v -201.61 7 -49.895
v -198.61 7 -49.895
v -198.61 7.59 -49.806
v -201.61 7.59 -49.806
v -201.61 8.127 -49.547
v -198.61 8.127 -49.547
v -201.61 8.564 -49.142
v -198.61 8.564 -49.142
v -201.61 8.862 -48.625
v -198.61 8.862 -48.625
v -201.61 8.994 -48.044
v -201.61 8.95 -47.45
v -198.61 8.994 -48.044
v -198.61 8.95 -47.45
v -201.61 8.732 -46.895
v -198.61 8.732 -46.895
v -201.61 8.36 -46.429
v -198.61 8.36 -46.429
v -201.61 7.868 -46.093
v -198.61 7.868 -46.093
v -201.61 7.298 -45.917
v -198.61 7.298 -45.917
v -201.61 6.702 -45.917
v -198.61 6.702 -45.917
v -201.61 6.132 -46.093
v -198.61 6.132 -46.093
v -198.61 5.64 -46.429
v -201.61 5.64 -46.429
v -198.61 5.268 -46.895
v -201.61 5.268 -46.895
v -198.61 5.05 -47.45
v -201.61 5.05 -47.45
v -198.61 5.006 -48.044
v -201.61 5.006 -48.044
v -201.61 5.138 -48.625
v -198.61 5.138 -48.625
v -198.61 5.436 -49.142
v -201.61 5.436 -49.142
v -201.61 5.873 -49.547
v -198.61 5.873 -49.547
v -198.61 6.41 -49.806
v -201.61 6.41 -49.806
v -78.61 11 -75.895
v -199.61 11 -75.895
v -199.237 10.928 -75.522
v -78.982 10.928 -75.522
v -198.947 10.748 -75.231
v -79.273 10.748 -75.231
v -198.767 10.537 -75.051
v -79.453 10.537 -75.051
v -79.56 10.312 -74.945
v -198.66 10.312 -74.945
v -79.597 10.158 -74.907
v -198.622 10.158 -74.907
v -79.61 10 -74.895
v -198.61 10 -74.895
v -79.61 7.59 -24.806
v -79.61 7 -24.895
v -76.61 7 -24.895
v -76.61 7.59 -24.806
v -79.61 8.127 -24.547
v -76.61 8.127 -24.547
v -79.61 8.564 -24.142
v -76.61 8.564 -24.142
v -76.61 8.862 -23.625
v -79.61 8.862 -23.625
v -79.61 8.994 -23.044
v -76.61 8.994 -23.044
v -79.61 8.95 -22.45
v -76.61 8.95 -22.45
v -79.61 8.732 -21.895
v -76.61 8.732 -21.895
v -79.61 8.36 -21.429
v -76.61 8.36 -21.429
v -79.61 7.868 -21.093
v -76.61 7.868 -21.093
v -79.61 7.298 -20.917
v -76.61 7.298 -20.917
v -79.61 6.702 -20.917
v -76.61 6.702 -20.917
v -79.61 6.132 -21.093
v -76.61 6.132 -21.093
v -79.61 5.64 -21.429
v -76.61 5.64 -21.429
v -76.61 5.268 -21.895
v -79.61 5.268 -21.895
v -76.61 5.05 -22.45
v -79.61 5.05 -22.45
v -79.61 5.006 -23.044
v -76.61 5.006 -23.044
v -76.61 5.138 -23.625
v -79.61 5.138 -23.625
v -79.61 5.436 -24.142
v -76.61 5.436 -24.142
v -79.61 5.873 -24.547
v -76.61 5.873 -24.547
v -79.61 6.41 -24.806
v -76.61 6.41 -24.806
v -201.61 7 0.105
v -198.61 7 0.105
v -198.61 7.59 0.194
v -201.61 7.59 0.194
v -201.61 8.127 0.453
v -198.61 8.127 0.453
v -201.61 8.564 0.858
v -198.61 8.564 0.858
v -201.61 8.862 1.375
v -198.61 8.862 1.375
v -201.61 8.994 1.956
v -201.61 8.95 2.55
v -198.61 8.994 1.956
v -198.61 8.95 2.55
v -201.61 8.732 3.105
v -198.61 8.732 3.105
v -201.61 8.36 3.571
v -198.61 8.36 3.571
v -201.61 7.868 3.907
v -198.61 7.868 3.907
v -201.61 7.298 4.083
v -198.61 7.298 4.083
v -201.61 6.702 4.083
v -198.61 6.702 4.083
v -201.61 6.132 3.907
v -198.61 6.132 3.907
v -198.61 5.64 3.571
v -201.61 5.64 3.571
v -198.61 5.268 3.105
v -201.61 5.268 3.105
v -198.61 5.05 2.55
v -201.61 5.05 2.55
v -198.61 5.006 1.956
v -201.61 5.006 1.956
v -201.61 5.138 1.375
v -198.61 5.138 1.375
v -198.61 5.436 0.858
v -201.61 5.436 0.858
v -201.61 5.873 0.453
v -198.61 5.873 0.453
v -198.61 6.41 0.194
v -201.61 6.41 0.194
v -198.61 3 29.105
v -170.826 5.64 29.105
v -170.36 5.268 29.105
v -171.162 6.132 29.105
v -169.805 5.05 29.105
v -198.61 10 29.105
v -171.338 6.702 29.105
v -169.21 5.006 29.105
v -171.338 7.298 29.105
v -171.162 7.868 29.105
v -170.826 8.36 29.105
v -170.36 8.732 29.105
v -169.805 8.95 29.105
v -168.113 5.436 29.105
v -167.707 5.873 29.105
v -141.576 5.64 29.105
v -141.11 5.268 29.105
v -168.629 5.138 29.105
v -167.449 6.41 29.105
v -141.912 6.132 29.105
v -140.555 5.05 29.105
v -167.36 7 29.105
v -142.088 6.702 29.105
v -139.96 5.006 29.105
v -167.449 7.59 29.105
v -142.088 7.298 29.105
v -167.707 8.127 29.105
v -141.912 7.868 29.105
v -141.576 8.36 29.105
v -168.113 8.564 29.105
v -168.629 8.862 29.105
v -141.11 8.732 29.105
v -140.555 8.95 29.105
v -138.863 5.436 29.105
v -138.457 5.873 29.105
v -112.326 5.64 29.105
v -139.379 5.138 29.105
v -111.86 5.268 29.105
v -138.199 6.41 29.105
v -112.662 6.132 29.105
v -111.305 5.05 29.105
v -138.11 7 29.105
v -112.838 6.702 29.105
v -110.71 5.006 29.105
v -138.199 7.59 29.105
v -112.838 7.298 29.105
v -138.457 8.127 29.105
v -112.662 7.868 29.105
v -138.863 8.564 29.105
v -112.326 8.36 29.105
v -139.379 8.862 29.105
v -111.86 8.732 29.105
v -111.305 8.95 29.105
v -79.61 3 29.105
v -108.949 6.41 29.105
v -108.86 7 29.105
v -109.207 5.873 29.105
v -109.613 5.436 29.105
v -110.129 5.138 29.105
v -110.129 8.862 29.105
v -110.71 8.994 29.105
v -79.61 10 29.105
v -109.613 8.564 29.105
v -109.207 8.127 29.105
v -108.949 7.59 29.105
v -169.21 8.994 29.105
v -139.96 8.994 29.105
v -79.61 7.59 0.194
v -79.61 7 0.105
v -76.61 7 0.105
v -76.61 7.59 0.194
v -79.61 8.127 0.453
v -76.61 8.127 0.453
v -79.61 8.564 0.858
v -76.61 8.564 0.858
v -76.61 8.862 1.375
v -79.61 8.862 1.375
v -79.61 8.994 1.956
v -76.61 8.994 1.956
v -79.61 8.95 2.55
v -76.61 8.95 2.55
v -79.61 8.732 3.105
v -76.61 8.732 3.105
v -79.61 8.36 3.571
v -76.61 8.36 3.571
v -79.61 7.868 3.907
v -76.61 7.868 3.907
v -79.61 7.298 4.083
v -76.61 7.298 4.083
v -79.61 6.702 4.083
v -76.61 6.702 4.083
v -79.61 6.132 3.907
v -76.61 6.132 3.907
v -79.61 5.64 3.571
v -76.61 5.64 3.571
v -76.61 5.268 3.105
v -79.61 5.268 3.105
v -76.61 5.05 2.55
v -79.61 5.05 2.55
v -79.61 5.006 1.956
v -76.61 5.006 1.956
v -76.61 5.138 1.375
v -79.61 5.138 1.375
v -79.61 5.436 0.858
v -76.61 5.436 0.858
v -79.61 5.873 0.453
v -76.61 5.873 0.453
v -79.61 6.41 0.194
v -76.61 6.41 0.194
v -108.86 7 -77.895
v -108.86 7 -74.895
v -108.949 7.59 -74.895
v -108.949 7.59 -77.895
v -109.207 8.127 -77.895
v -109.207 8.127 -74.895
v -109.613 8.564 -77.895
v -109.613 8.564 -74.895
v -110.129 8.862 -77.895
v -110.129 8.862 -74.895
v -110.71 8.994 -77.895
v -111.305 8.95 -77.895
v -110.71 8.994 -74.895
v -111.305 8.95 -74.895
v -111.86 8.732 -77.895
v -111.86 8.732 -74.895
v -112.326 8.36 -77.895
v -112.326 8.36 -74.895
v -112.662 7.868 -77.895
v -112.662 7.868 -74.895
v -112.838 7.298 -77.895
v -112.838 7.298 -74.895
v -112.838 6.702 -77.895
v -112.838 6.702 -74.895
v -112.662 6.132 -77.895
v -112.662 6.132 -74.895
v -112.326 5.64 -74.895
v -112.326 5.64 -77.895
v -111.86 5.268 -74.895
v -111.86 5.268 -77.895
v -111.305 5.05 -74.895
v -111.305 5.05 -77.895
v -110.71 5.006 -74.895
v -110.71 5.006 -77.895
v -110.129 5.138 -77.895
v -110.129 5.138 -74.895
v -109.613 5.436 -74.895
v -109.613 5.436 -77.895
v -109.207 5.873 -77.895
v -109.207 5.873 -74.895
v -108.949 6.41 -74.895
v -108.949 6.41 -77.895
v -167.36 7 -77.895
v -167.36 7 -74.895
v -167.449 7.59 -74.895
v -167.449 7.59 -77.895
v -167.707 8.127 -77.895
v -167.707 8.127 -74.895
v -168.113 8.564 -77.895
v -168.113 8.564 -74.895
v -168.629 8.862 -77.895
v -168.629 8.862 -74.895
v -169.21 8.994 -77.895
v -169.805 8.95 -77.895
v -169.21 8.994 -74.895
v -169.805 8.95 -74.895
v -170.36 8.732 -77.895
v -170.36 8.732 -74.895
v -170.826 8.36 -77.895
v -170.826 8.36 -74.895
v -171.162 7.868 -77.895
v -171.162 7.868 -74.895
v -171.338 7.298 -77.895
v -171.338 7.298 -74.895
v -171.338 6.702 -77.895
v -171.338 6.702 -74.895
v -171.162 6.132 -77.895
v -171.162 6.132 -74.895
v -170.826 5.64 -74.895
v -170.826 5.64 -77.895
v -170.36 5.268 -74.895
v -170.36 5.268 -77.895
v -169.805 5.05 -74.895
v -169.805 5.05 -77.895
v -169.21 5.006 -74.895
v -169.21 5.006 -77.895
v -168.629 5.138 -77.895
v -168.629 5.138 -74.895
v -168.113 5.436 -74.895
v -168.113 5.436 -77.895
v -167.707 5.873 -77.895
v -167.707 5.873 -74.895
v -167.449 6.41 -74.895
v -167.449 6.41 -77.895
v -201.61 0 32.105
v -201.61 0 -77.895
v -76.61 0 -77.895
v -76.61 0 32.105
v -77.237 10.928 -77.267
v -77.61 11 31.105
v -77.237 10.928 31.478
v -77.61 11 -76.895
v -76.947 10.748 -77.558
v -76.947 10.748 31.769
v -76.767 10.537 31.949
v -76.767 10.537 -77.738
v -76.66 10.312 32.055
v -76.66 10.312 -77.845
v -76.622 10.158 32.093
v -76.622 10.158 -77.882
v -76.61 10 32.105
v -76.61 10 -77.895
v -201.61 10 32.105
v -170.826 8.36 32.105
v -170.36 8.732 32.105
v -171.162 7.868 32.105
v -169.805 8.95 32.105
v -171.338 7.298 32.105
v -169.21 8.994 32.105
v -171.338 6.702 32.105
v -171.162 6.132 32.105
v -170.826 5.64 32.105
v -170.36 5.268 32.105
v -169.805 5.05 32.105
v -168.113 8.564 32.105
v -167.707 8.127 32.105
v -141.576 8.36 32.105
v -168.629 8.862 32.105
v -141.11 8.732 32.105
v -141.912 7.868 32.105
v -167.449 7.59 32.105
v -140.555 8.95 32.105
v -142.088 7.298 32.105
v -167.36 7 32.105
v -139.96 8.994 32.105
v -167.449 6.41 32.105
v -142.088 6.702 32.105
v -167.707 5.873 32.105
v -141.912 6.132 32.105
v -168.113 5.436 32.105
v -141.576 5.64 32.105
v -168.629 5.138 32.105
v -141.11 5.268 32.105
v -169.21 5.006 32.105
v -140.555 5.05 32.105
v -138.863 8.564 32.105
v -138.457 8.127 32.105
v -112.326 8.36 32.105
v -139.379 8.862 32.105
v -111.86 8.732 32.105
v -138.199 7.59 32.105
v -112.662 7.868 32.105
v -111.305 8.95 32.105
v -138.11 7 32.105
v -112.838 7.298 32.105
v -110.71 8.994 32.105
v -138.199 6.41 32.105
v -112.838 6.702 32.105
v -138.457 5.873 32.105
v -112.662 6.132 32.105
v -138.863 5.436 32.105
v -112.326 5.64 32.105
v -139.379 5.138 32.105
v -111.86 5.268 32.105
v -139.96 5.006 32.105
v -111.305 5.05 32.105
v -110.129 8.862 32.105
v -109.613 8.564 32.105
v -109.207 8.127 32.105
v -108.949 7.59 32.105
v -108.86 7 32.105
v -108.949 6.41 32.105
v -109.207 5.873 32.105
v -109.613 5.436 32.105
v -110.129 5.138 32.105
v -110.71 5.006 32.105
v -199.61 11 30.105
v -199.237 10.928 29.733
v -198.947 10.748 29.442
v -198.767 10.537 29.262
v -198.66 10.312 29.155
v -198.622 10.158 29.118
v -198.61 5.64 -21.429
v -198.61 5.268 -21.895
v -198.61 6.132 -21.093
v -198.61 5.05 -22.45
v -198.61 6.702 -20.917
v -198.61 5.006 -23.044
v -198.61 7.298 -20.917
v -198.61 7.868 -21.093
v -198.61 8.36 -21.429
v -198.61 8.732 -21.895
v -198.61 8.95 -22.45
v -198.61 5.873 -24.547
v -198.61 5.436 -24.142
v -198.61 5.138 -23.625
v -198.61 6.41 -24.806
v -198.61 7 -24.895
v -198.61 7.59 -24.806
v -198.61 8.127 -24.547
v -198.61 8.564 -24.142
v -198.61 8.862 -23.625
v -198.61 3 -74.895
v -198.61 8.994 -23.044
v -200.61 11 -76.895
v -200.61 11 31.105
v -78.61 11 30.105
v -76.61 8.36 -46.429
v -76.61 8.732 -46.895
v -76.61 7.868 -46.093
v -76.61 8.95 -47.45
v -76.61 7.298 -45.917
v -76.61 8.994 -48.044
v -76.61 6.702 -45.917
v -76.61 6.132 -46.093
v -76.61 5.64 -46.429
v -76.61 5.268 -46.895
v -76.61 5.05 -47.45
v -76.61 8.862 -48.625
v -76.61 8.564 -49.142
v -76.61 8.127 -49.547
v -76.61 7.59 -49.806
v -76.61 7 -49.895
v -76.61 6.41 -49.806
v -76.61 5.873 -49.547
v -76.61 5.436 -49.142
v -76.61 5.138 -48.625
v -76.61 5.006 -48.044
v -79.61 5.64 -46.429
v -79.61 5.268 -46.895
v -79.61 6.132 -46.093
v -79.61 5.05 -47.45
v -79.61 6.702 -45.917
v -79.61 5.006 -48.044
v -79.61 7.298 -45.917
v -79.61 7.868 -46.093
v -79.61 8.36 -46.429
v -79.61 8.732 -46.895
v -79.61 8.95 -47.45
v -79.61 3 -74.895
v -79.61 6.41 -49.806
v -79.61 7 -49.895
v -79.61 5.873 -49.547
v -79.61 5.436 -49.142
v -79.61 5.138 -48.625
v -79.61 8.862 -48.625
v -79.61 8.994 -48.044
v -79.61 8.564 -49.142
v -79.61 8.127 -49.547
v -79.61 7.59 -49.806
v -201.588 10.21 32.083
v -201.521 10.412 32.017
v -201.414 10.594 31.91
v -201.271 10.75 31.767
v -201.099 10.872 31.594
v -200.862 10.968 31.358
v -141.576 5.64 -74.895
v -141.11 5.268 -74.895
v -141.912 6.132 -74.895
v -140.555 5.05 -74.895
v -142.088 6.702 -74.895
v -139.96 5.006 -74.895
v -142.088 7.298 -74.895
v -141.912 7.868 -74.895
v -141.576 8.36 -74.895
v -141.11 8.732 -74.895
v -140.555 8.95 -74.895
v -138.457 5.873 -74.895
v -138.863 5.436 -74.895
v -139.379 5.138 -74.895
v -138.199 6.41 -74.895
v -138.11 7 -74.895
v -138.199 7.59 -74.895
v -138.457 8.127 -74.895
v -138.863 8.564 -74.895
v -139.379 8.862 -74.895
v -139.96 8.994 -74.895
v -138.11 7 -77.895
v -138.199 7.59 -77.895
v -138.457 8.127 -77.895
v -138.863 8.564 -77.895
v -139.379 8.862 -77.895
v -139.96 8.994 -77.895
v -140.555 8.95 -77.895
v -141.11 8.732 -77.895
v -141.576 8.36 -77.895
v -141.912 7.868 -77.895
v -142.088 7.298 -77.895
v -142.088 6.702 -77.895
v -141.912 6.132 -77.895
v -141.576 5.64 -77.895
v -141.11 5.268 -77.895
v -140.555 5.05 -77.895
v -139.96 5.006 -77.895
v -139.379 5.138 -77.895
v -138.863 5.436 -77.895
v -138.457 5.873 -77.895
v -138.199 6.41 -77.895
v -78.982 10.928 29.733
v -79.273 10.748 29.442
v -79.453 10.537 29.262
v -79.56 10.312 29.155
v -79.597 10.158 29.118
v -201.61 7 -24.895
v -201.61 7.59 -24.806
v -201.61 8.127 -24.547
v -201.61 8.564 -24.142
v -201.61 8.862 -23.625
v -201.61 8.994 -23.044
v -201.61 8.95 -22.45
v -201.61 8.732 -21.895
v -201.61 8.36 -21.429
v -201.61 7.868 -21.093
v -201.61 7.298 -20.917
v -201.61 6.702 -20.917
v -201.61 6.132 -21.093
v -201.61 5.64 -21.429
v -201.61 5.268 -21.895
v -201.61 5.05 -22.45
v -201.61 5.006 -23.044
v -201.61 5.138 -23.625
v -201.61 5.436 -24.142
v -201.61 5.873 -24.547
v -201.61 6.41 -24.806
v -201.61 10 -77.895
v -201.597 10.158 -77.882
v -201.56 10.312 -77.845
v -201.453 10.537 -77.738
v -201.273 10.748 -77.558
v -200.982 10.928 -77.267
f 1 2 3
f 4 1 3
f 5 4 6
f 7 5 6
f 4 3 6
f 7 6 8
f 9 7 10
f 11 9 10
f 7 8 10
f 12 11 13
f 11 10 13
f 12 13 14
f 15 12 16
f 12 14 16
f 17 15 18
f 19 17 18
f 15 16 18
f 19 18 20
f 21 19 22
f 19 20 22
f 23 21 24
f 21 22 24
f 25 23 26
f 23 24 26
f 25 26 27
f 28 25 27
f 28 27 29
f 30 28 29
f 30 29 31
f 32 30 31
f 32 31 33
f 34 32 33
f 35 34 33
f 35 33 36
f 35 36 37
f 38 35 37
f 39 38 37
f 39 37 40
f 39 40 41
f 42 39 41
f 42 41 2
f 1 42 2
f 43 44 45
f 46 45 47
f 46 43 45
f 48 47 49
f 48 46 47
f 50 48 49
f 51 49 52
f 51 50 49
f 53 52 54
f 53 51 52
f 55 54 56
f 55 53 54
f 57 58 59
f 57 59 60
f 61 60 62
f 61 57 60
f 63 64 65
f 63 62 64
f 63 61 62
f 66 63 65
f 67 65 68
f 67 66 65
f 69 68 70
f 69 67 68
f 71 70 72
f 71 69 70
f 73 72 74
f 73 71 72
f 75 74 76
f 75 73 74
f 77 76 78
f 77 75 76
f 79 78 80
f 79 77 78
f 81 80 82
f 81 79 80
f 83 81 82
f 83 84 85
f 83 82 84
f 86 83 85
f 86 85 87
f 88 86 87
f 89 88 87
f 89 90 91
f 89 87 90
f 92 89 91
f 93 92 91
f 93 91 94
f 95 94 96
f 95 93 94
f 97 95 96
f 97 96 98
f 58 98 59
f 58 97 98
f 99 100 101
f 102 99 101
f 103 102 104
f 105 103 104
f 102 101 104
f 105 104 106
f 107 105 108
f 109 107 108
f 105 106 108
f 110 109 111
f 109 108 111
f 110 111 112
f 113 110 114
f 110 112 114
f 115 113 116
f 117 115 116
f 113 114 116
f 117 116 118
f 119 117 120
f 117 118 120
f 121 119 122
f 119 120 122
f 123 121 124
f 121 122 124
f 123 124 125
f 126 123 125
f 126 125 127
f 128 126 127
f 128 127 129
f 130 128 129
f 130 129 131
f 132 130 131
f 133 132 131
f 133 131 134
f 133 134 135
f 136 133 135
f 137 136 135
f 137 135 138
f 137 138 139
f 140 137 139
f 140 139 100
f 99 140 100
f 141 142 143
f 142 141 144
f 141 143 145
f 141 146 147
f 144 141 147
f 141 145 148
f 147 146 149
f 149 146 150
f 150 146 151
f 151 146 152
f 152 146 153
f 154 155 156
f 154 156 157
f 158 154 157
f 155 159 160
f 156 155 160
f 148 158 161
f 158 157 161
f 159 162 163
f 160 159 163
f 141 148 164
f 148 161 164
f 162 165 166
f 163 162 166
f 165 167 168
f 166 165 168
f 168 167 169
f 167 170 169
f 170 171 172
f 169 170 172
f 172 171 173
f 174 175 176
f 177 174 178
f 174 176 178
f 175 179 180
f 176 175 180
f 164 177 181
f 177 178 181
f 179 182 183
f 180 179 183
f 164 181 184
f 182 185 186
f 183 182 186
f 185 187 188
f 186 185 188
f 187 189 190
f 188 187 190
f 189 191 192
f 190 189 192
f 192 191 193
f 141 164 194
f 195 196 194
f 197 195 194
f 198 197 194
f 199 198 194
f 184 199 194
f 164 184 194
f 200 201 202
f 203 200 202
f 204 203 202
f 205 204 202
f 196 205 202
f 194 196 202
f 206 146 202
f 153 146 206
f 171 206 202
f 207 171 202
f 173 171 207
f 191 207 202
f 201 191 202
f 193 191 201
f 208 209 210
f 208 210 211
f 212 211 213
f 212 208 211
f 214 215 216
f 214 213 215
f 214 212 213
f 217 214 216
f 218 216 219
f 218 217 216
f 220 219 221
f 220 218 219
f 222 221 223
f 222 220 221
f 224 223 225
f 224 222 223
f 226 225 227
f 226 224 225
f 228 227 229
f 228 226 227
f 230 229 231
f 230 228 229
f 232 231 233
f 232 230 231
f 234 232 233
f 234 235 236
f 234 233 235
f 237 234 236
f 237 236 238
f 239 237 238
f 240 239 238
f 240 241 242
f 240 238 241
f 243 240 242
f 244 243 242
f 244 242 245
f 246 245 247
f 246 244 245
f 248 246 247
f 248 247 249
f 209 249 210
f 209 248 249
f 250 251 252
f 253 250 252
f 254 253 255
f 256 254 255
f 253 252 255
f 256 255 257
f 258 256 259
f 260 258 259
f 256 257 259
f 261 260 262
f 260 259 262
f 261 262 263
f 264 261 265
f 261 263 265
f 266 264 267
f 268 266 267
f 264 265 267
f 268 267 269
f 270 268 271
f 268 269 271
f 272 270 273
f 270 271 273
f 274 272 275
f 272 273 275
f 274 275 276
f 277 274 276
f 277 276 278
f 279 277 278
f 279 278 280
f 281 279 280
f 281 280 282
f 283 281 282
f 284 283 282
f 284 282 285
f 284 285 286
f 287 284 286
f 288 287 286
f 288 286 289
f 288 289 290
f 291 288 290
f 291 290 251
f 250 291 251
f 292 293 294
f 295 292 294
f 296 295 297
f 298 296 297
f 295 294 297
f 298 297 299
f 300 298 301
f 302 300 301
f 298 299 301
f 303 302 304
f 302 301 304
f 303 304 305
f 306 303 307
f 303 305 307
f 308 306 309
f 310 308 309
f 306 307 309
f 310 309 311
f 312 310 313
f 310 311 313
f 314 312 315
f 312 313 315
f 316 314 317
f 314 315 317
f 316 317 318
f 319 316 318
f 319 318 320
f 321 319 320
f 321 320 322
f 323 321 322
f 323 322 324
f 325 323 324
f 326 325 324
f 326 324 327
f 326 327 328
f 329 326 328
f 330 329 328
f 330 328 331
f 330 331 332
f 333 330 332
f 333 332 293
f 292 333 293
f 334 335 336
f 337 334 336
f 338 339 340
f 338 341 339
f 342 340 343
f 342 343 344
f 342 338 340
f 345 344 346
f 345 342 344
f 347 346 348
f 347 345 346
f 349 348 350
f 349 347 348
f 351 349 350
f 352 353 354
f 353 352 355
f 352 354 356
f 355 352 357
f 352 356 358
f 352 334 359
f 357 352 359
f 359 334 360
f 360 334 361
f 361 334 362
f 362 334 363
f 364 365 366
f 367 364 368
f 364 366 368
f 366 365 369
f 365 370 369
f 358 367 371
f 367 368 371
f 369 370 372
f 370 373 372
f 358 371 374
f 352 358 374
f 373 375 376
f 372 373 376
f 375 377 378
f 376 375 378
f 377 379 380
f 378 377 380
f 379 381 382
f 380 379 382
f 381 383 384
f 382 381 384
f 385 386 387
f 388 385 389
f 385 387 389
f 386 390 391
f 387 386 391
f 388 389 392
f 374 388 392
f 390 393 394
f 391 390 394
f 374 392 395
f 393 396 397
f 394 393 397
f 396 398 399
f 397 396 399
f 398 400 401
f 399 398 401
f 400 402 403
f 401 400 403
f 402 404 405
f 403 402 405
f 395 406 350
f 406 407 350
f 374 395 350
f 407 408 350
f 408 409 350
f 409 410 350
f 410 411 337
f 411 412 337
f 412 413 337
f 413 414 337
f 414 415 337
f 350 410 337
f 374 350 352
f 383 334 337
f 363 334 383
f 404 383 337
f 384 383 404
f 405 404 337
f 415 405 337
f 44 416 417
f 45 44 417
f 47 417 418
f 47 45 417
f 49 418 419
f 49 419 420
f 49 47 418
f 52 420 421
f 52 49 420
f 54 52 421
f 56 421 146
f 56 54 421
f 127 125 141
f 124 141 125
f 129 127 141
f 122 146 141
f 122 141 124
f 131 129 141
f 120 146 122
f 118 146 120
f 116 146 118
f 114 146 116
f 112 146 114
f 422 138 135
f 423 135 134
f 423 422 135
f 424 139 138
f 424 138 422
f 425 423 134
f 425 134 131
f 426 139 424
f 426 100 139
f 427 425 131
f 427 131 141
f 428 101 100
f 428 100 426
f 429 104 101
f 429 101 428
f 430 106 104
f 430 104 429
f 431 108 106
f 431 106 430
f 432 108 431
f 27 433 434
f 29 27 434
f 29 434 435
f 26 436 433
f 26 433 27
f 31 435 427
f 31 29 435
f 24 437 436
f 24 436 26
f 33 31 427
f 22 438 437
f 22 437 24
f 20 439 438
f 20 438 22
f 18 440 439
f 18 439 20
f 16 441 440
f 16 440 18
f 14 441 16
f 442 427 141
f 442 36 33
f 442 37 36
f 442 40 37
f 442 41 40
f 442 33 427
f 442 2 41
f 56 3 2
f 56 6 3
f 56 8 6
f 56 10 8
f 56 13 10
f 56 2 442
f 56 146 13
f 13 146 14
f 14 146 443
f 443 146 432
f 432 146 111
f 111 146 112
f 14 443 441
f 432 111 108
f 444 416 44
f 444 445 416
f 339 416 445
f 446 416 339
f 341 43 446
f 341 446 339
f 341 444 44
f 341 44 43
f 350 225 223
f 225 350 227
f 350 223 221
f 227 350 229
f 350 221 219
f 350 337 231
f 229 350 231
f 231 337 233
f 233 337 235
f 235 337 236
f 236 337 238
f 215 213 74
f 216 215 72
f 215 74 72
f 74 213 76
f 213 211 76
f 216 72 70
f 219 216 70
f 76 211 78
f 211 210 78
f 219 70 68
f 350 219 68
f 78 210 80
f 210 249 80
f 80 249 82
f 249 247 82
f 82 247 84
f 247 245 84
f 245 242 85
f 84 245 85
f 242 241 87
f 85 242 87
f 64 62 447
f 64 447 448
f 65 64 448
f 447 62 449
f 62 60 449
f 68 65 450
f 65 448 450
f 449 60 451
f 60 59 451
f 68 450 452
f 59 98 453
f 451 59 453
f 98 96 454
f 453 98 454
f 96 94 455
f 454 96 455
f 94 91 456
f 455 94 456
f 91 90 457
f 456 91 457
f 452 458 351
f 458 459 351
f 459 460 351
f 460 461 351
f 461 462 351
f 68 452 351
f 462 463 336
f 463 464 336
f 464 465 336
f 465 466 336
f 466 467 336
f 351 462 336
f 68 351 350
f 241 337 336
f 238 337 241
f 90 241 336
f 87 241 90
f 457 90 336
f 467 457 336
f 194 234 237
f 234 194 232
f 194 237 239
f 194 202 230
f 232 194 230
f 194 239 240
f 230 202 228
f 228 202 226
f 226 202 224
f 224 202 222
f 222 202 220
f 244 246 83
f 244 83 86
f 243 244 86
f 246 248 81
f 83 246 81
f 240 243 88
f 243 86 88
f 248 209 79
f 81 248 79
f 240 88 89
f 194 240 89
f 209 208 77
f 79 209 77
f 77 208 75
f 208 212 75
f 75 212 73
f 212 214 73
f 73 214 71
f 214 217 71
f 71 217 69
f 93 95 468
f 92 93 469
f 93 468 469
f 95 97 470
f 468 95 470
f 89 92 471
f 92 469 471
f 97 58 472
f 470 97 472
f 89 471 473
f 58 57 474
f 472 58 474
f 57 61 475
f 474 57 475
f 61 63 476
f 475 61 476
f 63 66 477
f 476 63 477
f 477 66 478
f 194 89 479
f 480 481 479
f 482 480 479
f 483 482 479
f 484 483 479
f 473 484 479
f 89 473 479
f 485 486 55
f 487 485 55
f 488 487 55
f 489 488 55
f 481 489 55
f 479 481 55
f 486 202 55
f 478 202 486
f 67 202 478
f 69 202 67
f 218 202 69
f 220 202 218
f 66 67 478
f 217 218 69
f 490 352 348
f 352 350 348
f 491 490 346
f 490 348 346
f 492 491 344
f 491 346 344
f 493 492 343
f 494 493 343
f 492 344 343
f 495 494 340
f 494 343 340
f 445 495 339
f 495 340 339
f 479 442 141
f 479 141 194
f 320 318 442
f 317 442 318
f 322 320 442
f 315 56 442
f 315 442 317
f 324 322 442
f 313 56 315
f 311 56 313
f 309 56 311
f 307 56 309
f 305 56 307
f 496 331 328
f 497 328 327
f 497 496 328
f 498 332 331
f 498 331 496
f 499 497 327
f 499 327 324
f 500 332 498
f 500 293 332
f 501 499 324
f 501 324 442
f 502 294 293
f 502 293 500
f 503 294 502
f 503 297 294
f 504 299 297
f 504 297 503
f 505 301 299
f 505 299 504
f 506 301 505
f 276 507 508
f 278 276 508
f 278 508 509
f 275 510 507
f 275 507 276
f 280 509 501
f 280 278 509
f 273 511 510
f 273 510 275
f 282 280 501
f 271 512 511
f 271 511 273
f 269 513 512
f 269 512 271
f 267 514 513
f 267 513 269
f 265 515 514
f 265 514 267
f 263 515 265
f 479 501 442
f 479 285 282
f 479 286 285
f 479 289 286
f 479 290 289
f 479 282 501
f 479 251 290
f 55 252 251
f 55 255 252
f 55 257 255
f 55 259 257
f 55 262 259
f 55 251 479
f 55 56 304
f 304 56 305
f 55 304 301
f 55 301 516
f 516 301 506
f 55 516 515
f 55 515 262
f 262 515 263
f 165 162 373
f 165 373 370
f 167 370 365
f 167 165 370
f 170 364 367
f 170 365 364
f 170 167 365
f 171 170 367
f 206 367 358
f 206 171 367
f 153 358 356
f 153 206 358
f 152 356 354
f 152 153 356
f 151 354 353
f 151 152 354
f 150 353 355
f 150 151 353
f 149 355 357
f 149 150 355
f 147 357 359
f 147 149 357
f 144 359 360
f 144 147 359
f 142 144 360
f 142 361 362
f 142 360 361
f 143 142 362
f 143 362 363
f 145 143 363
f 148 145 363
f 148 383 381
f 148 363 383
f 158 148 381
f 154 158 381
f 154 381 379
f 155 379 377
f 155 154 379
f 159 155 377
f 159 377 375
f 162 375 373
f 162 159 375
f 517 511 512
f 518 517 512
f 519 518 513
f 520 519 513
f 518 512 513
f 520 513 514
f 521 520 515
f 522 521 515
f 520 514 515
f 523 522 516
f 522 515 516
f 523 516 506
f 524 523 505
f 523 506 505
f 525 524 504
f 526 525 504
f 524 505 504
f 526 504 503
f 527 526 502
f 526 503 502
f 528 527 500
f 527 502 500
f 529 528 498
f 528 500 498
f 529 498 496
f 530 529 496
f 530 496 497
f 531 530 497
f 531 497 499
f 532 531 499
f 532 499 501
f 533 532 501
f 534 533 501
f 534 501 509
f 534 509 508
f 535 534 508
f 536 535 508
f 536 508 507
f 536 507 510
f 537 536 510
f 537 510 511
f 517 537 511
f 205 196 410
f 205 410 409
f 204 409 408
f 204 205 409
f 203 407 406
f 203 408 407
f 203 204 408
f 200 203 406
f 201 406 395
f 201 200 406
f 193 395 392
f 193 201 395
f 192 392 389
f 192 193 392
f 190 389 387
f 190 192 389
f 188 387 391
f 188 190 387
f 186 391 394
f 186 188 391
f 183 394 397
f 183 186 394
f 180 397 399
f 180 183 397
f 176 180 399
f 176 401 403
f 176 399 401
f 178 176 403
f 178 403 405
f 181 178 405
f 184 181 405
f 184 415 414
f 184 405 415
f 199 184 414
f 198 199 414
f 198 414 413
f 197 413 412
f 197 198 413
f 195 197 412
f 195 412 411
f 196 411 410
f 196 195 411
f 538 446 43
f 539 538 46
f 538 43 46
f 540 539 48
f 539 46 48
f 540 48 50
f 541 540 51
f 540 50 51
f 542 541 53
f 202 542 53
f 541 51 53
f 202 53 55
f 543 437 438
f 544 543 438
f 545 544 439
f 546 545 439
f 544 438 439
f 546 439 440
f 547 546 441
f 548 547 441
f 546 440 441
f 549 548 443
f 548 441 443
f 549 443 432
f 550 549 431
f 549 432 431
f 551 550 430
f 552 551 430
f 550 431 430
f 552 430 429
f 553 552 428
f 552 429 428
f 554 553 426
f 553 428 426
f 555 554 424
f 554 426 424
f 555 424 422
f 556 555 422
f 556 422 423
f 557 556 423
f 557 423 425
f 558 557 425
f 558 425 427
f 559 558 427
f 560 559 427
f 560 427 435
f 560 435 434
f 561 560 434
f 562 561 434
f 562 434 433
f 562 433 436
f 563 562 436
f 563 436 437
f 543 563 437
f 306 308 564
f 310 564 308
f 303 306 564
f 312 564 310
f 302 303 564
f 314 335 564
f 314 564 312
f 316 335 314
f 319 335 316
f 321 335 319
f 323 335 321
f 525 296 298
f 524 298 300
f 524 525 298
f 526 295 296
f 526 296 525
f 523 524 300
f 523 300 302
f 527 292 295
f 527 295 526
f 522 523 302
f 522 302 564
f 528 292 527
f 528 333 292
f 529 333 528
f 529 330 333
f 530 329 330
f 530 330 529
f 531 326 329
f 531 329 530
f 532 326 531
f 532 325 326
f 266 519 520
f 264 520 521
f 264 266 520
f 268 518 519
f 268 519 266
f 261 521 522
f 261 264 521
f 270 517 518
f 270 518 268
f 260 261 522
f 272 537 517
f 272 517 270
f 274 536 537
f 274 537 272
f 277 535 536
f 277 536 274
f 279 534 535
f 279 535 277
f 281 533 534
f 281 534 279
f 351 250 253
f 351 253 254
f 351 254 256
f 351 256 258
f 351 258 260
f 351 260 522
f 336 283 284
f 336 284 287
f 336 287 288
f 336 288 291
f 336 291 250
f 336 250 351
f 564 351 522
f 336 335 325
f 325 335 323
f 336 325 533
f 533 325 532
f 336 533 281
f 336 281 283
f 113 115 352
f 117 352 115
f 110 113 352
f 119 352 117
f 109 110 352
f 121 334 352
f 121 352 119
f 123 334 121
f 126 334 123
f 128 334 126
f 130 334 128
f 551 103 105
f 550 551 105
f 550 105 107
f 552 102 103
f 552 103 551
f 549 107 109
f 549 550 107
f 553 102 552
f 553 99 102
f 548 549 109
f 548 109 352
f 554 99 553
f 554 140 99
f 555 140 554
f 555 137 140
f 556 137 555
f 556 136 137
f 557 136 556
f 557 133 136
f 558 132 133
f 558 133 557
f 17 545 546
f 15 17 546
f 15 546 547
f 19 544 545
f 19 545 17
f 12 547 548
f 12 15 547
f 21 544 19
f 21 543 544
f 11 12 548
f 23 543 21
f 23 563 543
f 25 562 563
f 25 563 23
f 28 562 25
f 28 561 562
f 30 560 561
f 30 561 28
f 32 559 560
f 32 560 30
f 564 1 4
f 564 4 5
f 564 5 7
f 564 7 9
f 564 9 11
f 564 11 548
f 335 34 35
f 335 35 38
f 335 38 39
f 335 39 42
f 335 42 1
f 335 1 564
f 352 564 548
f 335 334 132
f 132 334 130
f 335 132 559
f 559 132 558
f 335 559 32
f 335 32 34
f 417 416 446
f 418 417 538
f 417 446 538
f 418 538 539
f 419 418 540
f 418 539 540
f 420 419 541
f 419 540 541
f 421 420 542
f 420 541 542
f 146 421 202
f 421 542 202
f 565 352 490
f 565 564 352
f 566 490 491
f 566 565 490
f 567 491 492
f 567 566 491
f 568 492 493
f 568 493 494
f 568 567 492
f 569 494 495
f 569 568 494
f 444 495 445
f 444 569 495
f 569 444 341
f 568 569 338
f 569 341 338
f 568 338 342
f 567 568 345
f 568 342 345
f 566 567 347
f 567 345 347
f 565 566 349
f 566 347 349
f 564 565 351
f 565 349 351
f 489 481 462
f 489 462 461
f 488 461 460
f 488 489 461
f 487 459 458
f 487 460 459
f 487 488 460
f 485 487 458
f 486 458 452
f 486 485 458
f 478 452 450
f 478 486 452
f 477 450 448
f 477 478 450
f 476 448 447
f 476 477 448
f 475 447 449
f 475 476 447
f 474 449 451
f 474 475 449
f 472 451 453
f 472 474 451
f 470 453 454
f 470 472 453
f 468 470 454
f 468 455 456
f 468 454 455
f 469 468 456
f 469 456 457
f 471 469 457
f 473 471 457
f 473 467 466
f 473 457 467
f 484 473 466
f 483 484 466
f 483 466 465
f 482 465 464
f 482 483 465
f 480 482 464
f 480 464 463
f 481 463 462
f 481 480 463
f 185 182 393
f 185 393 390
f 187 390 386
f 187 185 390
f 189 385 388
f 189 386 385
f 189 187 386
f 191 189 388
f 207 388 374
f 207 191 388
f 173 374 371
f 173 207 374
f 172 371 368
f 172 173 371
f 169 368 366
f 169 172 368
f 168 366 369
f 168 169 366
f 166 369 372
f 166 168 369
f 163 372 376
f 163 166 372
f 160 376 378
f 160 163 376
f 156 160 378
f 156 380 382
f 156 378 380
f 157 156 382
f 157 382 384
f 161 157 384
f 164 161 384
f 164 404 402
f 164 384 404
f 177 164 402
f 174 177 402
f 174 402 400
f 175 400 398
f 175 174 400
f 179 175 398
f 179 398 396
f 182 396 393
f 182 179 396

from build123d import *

# Parameters (mm, degrees)
SKETCH1_W               = 125
SKETCH1_H               = 110
BOSS_EXTRUDE1_DEPTH     = 11
SKETCH4_W               = 119
SKETCH4_H               = 104
CUT_EXTRUDE1_DEPTH      = 8
SKETCH6_R               = 2
CUT_EXTRUDE6_DEPTH      = 123
CUT_EXTRUDE6_DEPTH_BACK = 4
SKETCH5_R               = 2
CUT_EXTRUDE5_DEPTH      = 108
CUT_EXTRUDE5_DEPTH_BACK = 4
FILLET2_R               = 1


with BuildPart() as part:
    # Sketch1 → Boss-Extrude1 (new body)
    with BuildSketch(Plane(origin=(0, 0, 0), x_dir=(1, 0, 0), z_dir=(0, 1, 0))):
        with Locations((-139.109907121, 22.894736842)):
            Rectangle(SKETCH1_W, SKETCH1_H)
    extrude(amount=BOSS_EXTRUDE1_DEPTH)

    # Sketch4 → Cut-Extrude1 (cut)
    with BuildSketch(Plane(origin=(0, 11, 0), x_dir=(1, 0, 0), z_dir=(0, 1, 0))):
        with Locations((-139.109907121, 22.894736842)):
            Rectangle(SKETCH4_W, SKETCH4_H)
    extrude(amount=-CUT_EXTRUDE1_DEPTH, mode=Mode.SUBTRACT)

    # Sketch6 → Cut-Extrude6 (cut, two sides)
    with BuildSketch(Plane(origin=(-198.609907121, 0, 0), x_dir=(0, 0, -1), z_dir=(1, 0, 0))) as cut_extrude6_sk:
        with Locations((-2.105263158, 6.999999953)):
            Circle(SKETCH6_R)
        with Locations((22.894736842, 6.999999953)):
            Circle(SKETCH6_R)
        with Locations((47.894736842, 7)):
            Circle(SKETCH6_R)
    extrude(amount=CUT_EXTRUDE6_DEPTH, mode=Mode.SUBTRACT)
    extrude(cut_extrude6_sk.sketch, amount=-CUT_EXTRUDE6_DEPTH_BACK, mode=Mode.SUBTRACT)

    # Sketch5 → Cut-Extrude5 (cut, two sides)
    with BuildSketch(Plane.XY.offset(-74.894736842)) as cut_extrude5_sk:
        with Locations((-169.359907121, 7)):
            Circle(SKETCH5_R)
        with Locations((-140.109907121, 7)):
            Circle(SKETCH5_R)
        with Locations((-110.859907121, 7)):
            Circle(SKETCH5_R)
    extrude(amount=CUT_EXTRUDE5_DEPTH, mode=Mode.SUBTRACT)
    extrude(cut_extrude5_sk.sketch, amount=-CUT_EXTRUDE5_DEPTH_BACK, mode=Mode.SUBTRACT)

    # Fillet2
    fillet2_edges = [part.edges().sort_by_distance(p)[0] for p in [
        (-76.609907121, 11, -22.894736842),
        (-139.109907121, 11, -77.894736842),
        (-198.609907121, 11, -22.894736842),
        (-139.109907121, 11, 29.105263158),
        (-79.609907121, 11, -22.894736842),
        (-139.109907121, 11, -74.894736842),
        (-201.609907121, 11, -22.894736842),
        (-139.109907121, 11, 32.105263158),
    ]]
    fillet(fillet2_edges, radius=FILLET2_R)


solid = part.part
